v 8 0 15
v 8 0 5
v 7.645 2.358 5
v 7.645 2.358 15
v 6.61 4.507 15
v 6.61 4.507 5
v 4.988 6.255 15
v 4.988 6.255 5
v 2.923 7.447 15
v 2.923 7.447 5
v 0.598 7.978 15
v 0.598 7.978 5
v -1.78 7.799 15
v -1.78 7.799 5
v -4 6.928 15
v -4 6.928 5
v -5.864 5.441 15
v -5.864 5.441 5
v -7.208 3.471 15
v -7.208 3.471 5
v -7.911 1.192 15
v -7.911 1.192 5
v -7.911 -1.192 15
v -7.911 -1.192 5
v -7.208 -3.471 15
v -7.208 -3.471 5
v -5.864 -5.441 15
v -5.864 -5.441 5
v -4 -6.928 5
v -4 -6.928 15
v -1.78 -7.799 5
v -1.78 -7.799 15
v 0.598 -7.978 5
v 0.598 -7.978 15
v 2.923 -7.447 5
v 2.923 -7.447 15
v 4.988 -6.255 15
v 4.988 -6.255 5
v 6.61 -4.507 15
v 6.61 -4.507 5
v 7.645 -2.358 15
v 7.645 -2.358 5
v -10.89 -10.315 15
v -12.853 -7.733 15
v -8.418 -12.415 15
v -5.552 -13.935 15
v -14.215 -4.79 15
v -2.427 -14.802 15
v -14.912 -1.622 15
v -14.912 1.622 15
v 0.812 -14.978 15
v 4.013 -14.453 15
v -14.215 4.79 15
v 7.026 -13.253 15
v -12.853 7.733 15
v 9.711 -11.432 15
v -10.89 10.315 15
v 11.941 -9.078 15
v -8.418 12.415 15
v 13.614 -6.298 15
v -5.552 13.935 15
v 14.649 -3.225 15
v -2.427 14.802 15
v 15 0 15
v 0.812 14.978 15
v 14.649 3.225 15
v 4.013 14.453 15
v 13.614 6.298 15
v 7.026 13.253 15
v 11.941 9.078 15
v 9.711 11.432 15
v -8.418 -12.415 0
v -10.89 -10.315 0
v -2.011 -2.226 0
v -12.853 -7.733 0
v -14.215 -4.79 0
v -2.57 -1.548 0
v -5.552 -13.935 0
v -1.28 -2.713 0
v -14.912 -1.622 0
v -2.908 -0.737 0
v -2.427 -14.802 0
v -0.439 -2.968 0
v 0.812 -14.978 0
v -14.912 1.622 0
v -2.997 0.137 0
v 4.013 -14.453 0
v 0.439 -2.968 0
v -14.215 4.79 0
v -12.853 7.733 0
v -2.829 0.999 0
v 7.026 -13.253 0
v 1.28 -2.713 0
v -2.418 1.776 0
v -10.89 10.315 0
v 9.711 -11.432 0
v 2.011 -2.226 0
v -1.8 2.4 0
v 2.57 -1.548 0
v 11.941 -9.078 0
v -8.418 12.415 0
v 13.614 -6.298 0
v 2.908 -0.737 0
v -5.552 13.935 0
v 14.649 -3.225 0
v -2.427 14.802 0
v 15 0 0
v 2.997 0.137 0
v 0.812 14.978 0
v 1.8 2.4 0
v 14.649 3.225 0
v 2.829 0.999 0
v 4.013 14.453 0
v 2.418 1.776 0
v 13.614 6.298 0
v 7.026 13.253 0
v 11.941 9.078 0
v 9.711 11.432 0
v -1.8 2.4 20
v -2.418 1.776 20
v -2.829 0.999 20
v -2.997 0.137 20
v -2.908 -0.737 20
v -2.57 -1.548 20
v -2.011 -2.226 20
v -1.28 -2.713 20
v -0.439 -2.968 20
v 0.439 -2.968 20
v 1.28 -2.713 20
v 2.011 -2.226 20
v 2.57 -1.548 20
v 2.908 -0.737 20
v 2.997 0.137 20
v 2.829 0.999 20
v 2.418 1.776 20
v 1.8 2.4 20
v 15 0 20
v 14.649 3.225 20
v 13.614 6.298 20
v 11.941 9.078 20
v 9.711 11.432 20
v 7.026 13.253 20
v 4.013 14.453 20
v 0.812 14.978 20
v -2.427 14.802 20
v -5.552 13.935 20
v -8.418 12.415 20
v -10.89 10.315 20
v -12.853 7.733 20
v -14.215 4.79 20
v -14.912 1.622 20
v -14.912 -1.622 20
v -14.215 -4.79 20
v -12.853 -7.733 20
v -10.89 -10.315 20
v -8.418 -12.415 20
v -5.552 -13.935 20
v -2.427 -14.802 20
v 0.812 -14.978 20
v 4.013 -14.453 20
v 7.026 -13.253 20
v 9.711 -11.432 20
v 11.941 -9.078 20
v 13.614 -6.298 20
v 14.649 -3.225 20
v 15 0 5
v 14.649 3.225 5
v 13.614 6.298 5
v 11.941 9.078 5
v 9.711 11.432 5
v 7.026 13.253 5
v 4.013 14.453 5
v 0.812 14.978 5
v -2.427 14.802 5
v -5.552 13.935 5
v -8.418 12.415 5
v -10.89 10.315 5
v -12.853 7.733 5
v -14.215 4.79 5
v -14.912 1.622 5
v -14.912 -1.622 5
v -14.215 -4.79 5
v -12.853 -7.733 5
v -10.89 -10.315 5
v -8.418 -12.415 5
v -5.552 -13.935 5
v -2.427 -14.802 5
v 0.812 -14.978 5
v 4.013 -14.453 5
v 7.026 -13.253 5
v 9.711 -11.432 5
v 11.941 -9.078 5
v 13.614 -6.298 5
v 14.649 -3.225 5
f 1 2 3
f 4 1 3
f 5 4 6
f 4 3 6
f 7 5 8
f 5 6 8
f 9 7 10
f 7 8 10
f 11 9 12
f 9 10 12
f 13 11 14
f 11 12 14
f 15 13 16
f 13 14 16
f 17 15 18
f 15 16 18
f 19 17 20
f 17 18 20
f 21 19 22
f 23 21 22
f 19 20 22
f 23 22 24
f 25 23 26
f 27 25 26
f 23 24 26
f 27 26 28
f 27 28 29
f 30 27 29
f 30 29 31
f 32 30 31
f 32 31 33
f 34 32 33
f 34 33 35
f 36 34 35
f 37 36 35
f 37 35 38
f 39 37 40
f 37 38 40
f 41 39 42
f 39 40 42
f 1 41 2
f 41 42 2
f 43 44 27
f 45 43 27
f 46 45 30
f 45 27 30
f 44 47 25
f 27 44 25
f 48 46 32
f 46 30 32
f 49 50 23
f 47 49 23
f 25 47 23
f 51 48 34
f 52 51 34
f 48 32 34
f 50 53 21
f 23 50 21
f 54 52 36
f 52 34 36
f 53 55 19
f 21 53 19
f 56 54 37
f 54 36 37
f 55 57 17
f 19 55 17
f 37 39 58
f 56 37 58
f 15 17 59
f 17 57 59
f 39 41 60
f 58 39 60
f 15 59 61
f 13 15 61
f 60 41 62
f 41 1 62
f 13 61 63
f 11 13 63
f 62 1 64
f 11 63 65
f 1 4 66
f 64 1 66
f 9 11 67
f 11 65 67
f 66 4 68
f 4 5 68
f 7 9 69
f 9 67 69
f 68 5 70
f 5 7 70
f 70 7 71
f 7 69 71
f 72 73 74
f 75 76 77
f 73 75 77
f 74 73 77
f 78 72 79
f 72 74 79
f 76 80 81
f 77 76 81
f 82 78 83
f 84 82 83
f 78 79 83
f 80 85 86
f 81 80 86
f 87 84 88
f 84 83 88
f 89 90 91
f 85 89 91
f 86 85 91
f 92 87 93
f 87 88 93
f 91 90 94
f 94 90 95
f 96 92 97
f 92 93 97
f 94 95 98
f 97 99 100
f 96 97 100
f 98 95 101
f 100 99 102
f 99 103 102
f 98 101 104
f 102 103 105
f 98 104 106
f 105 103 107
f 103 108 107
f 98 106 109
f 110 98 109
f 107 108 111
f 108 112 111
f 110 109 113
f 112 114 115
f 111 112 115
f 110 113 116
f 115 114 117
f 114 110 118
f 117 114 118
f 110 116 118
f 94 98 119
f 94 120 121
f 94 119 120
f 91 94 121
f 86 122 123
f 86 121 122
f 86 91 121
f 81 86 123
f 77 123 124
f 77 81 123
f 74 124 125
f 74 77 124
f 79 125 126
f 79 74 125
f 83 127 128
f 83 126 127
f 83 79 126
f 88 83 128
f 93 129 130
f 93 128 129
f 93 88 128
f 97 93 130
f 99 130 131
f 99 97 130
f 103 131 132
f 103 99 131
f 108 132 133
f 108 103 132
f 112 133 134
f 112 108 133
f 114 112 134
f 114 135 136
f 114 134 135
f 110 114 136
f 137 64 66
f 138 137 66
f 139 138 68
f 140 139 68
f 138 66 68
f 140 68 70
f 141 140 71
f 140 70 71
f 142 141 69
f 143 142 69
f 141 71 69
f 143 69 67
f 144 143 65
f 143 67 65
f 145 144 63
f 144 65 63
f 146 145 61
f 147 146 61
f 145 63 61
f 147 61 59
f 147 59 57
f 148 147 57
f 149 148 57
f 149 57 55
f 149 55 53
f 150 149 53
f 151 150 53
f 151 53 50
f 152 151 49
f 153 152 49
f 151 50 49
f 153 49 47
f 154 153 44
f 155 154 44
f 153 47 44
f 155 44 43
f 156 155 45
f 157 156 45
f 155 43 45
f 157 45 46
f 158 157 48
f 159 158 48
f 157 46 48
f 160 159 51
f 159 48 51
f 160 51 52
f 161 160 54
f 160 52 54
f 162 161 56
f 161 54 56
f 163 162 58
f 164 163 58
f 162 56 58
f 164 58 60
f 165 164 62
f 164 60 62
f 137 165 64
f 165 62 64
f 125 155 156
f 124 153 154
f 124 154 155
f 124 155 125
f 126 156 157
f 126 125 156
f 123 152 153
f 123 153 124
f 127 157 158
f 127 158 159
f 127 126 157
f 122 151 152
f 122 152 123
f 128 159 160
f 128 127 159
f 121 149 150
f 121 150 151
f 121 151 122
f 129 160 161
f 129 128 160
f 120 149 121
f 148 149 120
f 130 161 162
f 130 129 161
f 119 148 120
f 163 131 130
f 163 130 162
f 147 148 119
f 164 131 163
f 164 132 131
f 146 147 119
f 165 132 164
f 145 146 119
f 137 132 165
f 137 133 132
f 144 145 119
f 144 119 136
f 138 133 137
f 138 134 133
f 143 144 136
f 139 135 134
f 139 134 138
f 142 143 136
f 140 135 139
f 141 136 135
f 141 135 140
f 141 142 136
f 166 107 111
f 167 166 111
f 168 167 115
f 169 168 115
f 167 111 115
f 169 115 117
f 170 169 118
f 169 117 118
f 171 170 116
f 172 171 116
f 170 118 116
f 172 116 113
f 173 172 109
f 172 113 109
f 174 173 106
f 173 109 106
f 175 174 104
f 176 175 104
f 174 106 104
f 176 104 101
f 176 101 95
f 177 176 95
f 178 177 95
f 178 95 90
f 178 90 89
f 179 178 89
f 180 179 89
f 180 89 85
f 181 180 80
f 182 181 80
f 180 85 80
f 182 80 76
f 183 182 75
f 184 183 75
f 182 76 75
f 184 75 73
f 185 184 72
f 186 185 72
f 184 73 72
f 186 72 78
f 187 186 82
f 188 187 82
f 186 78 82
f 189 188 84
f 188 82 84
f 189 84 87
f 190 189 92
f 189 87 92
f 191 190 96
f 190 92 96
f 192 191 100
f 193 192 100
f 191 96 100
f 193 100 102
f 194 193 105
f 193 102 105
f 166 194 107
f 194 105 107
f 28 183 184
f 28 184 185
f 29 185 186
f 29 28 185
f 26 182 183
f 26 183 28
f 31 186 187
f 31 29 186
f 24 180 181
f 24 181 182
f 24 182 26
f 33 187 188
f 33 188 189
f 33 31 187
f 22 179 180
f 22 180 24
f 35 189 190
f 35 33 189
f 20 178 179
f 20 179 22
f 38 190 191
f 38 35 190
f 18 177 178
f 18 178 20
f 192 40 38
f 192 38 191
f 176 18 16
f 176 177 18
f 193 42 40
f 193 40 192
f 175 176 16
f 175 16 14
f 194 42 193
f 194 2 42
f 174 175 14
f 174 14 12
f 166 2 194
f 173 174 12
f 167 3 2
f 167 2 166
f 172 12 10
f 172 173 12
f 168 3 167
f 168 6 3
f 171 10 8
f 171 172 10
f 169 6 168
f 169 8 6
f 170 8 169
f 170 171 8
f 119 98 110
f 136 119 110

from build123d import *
from build123d.topology import SkipClean

# Parameters (mm, degrees)
ESQUISSE1_R        = 15
BOSS_EXTRU_2_DEPTH = 5
ESQUISSE3_R        = 8
ESQUISSE3_R_2      = 3
BOSS_EXTRU_3_DEPTH = 10
ESQUISSE4_R        = 15
ESQUISSE4_R_2      = 3
BOSS_EXTRU_4_DEPTH = 5
BOSS_EXTRU_5_DEPTH = 20


with BuildPart() as part:
    # Esquisse1 → Boss.-Extru.2 (new body)
    with BuildSketch(Plane.XY):
        Circle(ESQUISSE1_R)
        with BuildLine():
            ThreePointArc((3, 0), (-1.341640786, -2.683281573), (-1.8, 2.4))
            ThreePointArc((-1.8, 2.4), (0, 3), (1.8, 2.4))
            ThreePointArc((1.8, 2.4), (2.683281573, 1.341640786), (3, 0))
        make_face(mode=Mode.SUBTRACT)
    extrude(amount=BOSS_EXTRU_2_DEPTH)

    # Esquisse3 → Boss.-Extru.3 (add)
    with SkipClean():  # the faces are left unmerged after this step: merging them gives an invalid solid
        with BuildSketch(Plane.XY.offset(5)):
            Circle(ESQUISSE3_R)
            Circle(ESQUISSE3_R_2, mode=Mode.SUBTRACT)
        extrude(amount=BOSS_EXTRU_3_DEPTH)

    # Esquisse4 → Boss.-Extru.4 (add)
    with SkipClean():  # the faces are left unmerged after this step: merging them gives an invalid solid
        with BuildSketch(Plane.XY.offset(15)):
            Circle(ESQUISSE4_R)
            Circle(ESQUISSE4_R_2, mode=Mode.SUBTRACT)
        extrude(amount=BOSS_EXTRU_4_DEPTH)

    # Esquisse1<4> → Boss.-Extru.5 (add)
    with SkipClean():  # the faces are left unmerged after this step: merging them gives an invalid solid
        with BuildSketch(Plane.XY):
            with BuildLine():
                ThreePointArc((1.8, 2.4), (0, 3), (-1.8, 2.4))
                Line((-1.8, 2.4), (1.8, 2.4))
            make_face()
        extrude(amount=BOSS_EXTRU_5_DEPTH)


solid = part.part
